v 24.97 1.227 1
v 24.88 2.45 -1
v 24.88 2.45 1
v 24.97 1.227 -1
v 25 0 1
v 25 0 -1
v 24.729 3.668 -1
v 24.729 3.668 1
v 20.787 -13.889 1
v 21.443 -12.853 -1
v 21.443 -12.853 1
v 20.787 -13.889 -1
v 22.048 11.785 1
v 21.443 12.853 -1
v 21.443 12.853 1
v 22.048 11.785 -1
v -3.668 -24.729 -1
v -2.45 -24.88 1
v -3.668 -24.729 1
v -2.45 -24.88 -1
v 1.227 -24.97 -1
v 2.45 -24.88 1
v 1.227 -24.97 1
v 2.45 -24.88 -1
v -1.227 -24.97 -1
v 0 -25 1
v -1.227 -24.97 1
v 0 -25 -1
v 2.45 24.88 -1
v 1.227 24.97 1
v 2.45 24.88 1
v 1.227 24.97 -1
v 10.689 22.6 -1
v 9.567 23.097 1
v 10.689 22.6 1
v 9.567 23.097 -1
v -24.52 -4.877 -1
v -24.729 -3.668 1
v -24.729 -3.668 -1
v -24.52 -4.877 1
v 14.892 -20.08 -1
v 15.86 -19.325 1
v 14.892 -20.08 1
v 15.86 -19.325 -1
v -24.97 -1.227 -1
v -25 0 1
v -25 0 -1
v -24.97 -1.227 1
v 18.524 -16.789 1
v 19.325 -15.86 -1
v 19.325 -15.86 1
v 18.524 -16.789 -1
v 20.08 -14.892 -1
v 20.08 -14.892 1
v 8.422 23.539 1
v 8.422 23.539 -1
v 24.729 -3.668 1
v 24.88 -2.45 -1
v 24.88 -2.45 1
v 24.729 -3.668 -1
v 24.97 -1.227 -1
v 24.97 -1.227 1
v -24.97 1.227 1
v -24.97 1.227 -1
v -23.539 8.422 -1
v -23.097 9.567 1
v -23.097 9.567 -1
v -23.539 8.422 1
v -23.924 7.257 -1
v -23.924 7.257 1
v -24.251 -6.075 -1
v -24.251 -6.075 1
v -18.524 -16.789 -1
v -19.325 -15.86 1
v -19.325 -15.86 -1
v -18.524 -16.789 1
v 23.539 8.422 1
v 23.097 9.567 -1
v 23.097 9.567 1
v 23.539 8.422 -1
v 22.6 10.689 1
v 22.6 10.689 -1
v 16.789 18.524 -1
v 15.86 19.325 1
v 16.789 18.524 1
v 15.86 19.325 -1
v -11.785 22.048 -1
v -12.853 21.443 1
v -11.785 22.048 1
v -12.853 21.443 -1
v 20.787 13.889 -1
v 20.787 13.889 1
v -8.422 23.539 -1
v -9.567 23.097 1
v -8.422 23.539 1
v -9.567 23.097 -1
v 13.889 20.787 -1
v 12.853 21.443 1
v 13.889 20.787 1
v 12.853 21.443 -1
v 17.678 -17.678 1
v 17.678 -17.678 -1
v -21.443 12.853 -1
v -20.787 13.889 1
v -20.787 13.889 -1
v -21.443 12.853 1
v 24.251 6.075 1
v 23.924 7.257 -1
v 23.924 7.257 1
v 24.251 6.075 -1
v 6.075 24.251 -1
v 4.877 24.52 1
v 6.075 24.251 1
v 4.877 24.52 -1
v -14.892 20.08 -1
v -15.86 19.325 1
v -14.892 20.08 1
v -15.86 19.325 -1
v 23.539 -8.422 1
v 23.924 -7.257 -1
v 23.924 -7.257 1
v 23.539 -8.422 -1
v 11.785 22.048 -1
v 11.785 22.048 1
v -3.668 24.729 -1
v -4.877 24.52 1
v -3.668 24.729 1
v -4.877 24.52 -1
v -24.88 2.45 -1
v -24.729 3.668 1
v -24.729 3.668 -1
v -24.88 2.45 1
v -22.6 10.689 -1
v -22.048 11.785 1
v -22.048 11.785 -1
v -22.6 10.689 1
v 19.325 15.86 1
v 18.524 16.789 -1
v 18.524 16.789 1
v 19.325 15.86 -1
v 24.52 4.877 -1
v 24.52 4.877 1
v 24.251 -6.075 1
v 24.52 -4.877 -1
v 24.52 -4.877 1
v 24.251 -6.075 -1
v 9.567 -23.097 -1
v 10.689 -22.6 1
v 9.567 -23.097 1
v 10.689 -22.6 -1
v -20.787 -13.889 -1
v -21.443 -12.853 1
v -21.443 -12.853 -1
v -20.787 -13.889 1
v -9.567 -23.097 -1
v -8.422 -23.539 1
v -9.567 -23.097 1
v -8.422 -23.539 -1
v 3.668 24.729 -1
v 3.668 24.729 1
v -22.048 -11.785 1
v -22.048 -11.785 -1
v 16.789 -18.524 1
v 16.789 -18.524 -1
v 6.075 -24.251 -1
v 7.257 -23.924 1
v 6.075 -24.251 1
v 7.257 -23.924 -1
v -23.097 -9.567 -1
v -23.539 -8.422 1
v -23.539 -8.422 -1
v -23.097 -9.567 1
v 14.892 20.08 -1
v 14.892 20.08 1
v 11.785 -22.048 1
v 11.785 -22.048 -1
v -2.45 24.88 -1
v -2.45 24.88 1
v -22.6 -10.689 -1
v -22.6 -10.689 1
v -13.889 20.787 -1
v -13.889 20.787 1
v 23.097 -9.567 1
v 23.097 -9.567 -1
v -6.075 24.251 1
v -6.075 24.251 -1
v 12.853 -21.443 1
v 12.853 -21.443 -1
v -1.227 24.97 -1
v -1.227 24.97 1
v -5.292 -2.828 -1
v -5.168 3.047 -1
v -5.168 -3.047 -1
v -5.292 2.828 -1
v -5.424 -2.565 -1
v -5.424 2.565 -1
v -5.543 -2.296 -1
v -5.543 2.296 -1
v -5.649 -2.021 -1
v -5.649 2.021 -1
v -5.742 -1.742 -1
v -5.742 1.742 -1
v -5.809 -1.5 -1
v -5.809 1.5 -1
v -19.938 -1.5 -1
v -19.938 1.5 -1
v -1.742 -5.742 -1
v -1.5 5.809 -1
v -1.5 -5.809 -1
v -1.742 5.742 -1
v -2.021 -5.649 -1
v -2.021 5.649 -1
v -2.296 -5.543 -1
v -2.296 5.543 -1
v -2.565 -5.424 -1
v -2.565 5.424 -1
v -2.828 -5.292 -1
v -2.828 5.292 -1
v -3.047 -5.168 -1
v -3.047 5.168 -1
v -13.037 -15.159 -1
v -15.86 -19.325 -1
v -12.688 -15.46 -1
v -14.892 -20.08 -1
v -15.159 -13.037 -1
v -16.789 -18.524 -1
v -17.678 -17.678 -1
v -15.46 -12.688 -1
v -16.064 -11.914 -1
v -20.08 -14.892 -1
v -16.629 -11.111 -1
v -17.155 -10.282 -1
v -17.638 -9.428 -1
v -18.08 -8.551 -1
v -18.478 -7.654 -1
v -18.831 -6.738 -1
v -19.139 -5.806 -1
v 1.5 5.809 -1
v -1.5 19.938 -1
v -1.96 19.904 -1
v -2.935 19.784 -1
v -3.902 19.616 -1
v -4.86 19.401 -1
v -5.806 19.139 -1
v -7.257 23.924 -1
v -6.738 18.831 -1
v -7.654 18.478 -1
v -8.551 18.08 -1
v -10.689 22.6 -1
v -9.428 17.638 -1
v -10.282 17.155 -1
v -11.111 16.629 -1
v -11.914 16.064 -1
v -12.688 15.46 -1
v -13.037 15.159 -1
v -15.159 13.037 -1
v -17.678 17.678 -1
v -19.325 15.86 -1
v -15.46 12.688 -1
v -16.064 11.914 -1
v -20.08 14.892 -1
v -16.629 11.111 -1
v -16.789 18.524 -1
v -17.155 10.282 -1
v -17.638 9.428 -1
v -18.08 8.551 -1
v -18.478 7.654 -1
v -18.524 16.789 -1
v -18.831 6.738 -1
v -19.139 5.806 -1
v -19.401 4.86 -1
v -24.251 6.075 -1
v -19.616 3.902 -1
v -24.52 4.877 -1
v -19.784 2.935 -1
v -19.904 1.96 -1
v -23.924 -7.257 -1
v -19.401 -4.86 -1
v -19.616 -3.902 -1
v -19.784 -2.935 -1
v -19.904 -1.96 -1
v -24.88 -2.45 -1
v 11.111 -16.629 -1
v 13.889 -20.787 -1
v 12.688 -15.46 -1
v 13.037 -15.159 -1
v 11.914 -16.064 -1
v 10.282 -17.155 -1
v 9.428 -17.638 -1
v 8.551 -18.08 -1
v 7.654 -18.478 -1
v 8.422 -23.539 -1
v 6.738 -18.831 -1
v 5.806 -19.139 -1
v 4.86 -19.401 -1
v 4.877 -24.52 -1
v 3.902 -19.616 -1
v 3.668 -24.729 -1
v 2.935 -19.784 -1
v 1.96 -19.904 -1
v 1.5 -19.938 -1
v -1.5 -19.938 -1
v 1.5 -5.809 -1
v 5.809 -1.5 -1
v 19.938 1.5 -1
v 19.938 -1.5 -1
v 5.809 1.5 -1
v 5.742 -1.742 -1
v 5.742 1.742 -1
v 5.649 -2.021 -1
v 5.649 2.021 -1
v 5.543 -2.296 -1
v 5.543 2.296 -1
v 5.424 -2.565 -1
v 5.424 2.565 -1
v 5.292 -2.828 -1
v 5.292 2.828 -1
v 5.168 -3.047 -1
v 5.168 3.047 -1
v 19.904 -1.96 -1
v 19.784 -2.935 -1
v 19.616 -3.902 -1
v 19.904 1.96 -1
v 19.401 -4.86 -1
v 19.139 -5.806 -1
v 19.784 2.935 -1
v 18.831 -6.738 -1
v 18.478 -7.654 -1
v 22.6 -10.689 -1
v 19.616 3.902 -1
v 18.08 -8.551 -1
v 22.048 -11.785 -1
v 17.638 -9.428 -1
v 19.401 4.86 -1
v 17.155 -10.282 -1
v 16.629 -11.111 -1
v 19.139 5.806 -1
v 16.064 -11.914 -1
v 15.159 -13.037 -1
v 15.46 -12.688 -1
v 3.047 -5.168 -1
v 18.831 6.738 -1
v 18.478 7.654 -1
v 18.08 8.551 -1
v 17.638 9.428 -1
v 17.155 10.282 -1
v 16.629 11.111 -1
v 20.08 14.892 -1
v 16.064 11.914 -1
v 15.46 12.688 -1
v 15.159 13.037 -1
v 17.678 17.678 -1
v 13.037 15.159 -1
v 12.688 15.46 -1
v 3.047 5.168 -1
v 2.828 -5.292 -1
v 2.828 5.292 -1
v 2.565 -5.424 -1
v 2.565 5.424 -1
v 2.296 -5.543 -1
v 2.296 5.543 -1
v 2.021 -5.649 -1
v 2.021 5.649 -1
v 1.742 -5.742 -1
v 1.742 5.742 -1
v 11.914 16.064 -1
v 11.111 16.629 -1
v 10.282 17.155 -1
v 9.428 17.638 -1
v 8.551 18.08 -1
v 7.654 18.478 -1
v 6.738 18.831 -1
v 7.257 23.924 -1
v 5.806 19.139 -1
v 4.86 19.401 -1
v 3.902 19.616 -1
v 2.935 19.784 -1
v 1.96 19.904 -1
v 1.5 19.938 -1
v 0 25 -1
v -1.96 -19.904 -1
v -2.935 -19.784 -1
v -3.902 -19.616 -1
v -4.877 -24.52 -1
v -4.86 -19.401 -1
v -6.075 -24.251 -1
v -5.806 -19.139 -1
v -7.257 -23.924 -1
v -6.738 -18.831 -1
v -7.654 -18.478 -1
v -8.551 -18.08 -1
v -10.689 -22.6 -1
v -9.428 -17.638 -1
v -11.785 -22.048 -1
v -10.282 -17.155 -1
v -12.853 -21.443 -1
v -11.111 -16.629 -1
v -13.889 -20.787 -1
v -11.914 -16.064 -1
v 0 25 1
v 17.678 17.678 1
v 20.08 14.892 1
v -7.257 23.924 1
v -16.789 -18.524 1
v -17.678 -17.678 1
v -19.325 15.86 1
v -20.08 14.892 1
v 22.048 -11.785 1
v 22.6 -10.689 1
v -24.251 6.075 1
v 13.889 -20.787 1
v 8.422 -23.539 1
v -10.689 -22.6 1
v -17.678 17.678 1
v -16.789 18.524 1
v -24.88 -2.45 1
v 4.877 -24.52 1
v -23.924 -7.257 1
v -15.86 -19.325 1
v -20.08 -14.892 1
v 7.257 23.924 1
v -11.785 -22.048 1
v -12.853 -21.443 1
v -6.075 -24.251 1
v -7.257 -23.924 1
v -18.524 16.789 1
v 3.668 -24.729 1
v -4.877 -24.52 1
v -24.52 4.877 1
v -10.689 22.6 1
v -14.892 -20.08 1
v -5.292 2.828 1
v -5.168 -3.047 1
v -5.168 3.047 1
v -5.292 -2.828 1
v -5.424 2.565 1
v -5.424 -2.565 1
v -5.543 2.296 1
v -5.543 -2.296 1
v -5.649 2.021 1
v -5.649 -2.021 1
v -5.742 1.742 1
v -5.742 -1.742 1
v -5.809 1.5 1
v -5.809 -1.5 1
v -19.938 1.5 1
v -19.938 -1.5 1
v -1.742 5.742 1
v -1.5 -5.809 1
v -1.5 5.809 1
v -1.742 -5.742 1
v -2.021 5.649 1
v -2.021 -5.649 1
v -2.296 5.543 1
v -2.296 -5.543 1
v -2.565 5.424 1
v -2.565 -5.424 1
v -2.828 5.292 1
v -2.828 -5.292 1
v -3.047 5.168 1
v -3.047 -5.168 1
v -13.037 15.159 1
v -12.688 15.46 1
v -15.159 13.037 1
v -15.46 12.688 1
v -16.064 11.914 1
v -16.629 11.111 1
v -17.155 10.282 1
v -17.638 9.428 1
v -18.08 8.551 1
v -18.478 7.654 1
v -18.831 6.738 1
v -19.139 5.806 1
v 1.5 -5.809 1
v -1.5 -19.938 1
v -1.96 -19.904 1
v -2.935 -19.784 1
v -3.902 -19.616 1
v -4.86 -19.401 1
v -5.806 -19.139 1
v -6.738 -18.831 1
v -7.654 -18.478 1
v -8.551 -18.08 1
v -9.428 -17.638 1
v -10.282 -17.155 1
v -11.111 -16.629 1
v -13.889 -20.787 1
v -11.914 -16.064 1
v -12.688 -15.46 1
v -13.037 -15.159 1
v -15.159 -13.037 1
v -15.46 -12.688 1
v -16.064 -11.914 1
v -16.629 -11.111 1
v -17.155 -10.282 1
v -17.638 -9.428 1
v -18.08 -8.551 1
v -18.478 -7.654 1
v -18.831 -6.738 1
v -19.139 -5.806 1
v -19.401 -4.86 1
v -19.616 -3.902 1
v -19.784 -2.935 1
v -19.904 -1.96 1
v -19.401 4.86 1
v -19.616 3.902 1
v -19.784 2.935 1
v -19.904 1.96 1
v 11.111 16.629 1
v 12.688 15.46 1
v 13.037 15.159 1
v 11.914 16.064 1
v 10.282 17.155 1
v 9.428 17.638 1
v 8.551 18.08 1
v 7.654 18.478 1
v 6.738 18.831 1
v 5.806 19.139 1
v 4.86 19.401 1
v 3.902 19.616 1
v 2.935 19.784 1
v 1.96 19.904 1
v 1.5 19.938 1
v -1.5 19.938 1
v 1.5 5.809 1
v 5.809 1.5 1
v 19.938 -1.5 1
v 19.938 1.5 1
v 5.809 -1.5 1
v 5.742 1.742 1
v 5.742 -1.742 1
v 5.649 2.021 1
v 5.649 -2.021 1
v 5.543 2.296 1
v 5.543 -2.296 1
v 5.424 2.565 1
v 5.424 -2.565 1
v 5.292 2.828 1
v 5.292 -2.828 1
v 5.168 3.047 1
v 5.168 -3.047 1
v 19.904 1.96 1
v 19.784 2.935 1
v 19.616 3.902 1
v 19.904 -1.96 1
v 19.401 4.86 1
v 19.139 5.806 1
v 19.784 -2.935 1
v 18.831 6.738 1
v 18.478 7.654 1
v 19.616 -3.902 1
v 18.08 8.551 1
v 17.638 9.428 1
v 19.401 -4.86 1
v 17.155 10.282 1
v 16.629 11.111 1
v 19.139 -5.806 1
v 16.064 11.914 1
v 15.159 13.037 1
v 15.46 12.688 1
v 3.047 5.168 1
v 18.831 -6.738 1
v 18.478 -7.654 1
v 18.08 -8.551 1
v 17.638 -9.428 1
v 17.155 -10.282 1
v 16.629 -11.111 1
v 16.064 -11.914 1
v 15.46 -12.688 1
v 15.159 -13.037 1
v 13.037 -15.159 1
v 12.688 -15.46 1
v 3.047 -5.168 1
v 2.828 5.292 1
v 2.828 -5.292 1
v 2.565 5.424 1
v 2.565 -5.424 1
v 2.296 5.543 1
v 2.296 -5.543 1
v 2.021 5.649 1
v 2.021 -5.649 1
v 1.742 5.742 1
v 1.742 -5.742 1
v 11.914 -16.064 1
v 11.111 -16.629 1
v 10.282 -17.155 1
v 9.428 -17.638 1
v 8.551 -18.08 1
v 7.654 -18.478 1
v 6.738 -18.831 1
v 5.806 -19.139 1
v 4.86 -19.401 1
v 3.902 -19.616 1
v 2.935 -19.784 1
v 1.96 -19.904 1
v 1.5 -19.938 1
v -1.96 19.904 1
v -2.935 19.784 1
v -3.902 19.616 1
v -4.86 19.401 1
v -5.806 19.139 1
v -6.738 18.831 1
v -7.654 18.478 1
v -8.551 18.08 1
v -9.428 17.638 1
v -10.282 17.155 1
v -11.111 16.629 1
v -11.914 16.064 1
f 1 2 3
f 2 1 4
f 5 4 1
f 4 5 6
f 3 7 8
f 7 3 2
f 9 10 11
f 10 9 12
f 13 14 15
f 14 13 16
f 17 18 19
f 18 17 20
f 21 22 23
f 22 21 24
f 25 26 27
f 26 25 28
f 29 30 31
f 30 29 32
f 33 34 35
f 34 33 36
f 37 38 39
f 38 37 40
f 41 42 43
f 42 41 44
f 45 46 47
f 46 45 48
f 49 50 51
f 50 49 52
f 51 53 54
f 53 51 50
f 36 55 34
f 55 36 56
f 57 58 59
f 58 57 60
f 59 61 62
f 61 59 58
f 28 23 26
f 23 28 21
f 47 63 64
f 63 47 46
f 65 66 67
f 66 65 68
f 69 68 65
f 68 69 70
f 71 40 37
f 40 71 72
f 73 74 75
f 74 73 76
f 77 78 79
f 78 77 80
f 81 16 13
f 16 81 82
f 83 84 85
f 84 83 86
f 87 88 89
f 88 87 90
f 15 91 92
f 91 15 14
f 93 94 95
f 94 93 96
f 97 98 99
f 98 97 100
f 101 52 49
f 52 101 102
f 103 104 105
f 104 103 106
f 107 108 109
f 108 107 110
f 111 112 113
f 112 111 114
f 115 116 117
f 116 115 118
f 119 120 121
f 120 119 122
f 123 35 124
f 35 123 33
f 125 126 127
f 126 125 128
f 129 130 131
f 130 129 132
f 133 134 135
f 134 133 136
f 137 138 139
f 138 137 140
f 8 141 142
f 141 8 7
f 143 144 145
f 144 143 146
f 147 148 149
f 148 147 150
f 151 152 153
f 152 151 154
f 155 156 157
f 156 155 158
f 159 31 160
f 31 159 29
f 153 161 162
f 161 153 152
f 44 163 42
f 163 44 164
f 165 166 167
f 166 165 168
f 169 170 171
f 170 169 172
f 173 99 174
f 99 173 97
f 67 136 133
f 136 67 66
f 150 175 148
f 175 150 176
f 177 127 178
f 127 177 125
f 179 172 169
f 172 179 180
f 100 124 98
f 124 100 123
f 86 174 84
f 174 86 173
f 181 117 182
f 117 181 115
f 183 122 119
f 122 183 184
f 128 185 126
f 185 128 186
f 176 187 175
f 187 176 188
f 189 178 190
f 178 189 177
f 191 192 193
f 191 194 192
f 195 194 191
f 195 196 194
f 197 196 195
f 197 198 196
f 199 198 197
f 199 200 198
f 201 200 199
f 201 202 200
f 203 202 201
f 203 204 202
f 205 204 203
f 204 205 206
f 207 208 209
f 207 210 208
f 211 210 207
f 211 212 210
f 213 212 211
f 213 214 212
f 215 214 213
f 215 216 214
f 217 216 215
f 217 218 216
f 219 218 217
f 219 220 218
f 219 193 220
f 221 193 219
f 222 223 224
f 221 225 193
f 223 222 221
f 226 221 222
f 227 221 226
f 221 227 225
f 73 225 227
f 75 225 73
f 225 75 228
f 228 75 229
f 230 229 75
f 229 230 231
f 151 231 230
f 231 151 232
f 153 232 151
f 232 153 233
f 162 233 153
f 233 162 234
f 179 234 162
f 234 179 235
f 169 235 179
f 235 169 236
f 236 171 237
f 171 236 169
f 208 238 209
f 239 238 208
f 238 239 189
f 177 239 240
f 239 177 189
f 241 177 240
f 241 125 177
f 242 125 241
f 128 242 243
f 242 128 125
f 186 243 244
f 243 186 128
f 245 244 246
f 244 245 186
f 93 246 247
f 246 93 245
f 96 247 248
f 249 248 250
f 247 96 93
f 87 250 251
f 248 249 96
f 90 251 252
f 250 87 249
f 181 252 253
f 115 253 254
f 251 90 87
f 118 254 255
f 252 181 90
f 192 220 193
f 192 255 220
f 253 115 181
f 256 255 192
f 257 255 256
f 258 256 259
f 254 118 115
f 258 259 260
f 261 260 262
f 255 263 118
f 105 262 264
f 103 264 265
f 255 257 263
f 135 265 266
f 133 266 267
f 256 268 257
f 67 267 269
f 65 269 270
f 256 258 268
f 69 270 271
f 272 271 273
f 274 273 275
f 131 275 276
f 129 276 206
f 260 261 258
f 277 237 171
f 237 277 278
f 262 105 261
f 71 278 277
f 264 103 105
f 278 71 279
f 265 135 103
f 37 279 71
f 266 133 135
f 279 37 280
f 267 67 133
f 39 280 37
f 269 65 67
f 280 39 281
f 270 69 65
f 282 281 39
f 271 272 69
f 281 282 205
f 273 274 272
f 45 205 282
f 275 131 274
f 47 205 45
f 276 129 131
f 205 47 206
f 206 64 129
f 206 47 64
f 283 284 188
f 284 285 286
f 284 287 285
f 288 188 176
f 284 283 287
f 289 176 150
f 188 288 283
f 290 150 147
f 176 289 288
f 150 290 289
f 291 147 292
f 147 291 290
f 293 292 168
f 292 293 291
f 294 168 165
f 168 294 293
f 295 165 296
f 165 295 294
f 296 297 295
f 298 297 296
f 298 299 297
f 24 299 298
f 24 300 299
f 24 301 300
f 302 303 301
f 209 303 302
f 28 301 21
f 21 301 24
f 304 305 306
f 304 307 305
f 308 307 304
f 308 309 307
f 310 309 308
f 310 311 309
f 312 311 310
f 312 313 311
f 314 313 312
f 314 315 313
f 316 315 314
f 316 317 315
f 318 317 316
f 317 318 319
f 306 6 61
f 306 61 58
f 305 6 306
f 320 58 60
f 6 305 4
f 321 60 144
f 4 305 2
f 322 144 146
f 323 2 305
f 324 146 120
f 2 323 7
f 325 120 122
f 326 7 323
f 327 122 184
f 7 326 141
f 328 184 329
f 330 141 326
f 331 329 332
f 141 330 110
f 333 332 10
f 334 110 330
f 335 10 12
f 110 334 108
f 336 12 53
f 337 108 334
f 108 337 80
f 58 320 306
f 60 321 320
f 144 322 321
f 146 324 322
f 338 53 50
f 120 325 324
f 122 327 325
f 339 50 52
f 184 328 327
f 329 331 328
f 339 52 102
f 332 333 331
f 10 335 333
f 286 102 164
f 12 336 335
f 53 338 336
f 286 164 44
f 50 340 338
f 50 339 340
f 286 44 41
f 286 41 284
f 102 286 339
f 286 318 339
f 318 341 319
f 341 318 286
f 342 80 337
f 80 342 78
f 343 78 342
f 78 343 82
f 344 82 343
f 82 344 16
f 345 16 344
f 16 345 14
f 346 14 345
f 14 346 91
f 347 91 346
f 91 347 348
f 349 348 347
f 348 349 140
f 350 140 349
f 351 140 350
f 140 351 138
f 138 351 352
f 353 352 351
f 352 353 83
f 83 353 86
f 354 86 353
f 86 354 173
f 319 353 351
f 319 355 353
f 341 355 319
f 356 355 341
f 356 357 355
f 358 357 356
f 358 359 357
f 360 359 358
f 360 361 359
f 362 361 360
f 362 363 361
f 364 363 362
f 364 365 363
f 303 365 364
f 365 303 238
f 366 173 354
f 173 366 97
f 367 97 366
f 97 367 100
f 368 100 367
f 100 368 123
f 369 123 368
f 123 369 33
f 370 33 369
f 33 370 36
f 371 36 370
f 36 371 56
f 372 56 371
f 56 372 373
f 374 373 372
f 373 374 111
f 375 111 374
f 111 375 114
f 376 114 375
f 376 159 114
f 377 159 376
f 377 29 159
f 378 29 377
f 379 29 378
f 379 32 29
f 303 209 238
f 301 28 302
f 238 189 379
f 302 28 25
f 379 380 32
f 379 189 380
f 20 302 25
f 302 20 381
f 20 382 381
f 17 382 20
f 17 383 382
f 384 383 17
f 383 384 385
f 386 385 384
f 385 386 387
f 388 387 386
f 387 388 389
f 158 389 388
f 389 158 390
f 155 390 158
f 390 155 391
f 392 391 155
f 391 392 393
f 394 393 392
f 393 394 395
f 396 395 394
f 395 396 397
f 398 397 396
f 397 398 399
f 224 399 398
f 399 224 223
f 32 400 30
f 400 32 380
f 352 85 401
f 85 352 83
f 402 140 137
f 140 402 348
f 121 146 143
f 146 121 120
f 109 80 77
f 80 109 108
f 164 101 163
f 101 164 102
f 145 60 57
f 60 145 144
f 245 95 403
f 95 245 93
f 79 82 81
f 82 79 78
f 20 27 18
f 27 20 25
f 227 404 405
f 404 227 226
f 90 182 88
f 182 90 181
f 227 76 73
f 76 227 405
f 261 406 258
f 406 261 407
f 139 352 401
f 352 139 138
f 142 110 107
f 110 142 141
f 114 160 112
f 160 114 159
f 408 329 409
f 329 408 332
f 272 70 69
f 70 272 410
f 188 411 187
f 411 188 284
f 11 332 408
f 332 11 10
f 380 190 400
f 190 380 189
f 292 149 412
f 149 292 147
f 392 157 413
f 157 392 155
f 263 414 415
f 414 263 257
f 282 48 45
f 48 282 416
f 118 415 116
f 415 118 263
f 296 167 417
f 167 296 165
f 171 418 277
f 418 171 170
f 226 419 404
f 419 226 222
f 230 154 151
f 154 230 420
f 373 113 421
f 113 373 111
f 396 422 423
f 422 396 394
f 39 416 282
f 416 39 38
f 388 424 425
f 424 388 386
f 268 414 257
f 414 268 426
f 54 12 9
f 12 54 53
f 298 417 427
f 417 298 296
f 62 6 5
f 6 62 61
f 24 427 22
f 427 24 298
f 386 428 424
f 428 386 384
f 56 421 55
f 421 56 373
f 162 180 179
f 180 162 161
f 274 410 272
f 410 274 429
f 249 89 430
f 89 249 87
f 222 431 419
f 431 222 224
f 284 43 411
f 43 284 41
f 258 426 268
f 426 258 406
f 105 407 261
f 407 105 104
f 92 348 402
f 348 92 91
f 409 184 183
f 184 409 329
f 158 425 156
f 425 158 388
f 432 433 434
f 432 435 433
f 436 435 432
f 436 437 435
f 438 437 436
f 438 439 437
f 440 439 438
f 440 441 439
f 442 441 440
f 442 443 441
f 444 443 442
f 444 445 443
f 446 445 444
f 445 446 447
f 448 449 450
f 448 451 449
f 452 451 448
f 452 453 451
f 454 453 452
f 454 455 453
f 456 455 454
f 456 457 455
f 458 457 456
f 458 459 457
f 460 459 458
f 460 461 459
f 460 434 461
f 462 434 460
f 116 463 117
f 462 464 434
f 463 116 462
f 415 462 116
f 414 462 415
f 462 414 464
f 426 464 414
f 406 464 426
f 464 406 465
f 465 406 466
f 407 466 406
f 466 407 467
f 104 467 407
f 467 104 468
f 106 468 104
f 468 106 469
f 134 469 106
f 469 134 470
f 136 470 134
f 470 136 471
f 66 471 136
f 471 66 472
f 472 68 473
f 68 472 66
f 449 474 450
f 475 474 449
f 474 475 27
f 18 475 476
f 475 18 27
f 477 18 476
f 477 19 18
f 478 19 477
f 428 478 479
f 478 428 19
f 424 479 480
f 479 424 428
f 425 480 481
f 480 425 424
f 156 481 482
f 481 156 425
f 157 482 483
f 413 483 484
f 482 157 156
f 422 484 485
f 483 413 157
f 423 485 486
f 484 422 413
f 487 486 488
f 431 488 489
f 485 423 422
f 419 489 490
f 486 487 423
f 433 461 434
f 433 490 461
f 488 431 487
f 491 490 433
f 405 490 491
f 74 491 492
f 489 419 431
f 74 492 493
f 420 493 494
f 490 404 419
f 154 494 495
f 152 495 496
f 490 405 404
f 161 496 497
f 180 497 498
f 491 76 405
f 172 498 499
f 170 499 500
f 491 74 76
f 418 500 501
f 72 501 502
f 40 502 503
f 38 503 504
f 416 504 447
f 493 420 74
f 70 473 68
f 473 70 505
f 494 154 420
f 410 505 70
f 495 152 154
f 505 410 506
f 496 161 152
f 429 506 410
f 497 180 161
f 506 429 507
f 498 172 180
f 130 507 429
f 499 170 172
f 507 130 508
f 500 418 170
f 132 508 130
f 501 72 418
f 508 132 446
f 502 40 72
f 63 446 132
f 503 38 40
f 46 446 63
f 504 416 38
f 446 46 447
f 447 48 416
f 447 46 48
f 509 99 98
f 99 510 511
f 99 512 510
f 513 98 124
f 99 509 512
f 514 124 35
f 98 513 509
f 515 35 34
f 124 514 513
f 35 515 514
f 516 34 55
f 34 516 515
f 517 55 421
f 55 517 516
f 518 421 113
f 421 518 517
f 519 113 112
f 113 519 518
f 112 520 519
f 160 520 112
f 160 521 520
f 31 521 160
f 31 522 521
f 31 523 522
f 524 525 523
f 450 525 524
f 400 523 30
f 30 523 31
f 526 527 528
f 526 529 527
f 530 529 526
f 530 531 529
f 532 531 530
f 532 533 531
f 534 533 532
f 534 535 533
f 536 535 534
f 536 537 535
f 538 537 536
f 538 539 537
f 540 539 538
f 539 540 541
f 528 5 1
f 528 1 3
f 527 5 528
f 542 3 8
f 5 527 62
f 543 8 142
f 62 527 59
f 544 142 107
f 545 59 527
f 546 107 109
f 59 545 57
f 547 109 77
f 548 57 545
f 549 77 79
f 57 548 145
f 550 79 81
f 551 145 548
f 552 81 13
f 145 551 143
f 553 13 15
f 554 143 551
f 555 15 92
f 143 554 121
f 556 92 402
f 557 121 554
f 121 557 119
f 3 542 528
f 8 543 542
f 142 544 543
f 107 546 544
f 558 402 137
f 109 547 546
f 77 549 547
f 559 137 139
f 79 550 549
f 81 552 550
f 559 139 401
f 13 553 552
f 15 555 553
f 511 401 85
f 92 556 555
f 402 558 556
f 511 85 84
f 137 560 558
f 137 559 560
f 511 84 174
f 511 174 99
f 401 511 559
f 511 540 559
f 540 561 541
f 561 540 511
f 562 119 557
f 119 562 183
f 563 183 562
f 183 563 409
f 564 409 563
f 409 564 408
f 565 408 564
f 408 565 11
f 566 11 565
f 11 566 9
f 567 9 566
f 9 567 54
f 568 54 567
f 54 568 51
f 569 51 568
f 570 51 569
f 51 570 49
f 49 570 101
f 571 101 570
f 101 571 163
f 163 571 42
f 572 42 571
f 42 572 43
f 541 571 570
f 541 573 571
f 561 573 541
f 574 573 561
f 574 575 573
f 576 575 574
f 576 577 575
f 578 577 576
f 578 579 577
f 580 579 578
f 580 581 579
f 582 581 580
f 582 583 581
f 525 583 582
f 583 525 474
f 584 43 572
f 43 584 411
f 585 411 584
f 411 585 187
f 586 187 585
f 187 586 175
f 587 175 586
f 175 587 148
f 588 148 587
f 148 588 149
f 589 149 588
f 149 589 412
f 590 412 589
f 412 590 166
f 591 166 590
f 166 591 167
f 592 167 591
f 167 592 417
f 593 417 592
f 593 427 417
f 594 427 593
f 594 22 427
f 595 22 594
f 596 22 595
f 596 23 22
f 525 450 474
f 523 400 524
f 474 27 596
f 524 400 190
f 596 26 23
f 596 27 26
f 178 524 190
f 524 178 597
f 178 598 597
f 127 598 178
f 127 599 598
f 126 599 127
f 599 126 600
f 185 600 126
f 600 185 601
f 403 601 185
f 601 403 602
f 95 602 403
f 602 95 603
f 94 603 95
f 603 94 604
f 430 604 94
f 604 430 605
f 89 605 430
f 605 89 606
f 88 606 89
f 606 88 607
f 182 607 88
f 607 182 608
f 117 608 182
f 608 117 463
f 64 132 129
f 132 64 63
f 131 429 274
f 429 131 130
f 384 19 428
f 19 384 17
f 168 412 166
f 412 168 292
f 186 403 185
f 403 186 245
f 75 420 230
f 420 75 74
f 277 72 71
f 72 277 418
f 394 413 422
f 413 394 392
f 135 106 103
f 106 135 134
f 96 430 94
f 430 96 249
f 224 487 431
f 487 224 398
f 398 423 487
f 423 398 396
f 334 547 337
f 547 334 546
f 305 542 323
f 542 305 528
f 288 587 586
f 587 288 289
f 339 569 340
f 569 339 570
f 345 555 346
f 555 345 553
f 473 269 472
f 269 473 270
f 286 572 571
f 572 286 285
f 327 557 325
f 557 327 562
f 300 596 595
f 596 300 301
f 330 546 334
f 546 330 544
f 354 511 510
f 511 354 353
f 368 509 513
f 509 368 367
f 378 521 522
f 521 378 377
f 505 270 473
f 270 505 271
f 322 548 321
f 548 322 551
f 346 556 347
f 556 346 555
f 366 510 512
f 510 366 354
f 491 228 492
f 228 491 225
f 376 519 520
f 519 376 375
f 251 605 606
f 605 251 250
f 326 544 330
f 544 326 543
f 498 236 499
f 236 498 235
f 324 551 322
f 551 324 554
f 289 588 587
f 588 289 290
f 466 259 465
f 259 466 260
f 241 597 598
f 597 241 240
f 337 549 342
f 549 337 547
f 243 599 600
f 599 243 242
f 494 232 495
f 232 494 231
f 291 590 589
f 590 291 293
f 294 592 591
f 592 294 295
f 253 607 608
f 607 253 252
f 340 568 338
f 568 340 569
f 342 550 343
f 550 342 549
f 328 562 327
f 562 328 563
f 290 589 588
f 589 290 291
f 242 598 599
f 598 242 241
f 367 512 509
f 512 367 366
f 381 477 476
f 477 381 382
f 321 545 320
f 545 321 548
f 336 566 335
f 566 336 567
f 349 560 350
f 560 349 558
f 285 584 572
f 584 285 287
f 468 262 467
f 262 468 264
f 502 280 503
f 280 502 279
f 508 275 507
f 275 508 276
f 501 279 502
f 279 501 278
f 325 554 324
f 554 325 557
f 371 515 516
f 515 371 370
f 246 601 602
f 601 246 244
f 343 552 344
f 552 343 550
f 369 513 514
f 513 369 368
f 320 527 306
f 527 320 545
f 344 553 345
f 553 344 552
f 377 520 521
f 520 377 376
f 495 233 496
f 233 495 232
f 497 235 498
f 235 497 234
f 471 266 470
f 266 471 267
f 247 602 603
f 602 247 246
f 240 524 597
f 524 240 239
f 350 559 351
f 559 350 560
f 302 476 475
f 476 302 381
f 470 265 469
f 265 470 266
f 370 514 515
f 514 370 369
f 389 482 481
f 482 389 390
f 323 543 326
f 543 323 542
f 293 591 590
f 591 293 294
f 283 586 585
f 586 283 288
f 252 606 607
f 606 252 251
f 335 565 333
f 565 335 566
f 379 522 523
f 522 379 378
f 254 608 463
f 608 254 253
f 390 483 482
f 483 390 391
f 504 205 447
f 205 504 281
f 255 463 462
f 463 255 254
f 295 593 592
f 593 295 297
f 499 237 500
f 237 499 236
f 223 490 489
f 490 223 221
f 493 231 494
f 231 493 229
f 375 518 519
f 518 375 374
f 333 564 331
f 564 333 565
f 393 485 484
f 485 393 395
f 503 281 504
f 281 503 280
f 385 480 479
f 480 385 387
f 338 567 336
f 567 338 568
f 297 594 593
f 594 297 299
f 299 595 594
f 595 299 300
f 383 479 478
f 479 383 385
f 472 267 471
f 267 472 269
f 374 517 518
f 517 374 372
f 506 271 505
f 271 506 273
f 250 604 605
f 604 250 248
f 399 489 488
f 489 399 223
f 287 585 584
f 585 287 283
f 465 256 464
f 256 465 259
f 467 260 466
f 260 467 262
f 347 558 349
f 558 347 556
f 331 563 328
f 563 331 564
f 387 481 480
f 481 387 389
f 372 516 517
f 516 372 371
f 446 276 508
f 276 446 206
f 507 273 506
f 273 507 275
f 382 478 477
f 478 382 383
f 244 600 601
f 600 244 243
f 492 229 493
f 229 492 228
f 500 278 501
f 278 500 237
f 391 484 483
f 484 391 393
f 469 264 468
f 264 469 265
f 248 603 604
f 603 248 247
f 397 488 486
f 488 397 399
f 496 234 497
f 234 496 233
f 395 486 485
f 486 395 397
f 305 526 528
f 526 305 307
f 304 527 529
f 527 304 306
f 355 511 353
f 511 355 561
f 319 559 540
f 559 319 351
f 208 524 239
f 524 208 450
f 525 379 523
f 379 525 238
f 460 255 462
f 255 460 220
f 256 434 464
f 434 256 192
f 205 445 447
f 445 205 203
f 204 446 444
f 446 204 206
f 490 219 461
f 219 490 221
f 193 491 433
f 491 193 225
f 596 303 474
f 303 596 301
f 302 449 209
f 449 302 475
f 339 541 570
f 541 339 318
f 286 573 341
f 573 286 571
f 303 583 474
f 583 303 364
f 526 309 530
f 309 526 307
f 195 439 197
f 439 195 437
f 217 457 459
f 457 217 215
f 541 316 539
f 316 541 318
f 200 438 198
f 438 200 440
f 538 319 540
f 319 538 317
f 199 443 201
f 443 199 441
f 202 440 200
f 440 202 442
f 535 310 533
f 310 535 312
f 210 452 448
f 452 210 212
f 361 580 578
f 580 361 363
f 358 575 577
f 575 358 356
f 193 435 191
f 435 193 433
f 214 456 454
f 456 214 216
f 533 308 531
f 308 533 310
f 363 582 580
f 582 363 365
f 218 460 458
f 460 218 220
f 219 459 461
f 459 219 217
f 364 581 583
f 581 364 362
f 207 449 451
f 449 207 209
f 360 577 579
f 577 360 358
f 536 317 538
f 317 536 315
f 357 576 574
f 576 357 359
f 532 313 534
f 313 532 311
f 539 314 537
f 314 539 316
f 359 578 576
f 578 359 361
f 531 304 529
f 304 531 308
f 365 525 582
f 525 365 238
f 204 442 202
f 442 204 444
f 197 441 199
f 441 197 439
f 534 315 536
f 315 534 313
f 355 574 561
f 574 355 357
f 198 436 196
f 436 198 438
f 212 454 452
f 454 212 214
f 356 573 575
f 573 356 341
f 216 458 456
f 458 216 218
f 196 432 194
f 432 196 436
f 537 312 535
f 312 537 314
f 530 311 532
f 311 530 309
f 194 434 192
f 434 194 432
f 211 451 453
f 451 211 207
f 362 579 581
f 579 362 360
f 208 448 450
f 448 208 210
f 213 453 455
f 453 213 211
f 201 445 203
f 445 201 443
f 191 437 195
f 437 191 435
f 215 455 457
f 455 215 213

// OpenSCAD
//
//  A simple customisable wheel design by MattKi
//  Created because someone had a wheel design in the facebook group which
//  wasn't designed as a proper circle.
//

// How thick is the wheel?
height = 2;
// What's it's outer diameter?
outer_dia = 50;
// What's it's inner diameter?
inner_dia = 40;
// If you want a circle in the middle set this to something greater than zero.
hub_dia = 12;
// How detailed does the wheel need to be? Advisable to keep to 64 or less.
detail = 32;
// How many spokes are there?
spoke_count = 8;
// How thick are the spokes?
spoke_thickness = 3;
// A variable used to avoid face fighting in difference operations.
tol = 0.01;

union(){
    difference(){
        cylinder(h=height,d=outer_dia,$fn=detail*4,center=true); // Our wheel
        cylinder(h=height+tol,d=inner_dia,$fn=detail*4,center=true); // Cut out the inner diameter from the wheel.
    }
    for (a=[0:spoke_count-1]){
        rotate([0,0,a*(360/spoke_count)]) translate([inner_dia/4+tol/2,0,0]) cube([inner_dia/2+tol,spoke_thickness,height],center=true); // Create spokes and rotate them into the right positions.
    }
    cylinder(h=height,d=hub_dia,$fn=detail*4,center=true); // Add a hub in the middle if the user wants it.
}
